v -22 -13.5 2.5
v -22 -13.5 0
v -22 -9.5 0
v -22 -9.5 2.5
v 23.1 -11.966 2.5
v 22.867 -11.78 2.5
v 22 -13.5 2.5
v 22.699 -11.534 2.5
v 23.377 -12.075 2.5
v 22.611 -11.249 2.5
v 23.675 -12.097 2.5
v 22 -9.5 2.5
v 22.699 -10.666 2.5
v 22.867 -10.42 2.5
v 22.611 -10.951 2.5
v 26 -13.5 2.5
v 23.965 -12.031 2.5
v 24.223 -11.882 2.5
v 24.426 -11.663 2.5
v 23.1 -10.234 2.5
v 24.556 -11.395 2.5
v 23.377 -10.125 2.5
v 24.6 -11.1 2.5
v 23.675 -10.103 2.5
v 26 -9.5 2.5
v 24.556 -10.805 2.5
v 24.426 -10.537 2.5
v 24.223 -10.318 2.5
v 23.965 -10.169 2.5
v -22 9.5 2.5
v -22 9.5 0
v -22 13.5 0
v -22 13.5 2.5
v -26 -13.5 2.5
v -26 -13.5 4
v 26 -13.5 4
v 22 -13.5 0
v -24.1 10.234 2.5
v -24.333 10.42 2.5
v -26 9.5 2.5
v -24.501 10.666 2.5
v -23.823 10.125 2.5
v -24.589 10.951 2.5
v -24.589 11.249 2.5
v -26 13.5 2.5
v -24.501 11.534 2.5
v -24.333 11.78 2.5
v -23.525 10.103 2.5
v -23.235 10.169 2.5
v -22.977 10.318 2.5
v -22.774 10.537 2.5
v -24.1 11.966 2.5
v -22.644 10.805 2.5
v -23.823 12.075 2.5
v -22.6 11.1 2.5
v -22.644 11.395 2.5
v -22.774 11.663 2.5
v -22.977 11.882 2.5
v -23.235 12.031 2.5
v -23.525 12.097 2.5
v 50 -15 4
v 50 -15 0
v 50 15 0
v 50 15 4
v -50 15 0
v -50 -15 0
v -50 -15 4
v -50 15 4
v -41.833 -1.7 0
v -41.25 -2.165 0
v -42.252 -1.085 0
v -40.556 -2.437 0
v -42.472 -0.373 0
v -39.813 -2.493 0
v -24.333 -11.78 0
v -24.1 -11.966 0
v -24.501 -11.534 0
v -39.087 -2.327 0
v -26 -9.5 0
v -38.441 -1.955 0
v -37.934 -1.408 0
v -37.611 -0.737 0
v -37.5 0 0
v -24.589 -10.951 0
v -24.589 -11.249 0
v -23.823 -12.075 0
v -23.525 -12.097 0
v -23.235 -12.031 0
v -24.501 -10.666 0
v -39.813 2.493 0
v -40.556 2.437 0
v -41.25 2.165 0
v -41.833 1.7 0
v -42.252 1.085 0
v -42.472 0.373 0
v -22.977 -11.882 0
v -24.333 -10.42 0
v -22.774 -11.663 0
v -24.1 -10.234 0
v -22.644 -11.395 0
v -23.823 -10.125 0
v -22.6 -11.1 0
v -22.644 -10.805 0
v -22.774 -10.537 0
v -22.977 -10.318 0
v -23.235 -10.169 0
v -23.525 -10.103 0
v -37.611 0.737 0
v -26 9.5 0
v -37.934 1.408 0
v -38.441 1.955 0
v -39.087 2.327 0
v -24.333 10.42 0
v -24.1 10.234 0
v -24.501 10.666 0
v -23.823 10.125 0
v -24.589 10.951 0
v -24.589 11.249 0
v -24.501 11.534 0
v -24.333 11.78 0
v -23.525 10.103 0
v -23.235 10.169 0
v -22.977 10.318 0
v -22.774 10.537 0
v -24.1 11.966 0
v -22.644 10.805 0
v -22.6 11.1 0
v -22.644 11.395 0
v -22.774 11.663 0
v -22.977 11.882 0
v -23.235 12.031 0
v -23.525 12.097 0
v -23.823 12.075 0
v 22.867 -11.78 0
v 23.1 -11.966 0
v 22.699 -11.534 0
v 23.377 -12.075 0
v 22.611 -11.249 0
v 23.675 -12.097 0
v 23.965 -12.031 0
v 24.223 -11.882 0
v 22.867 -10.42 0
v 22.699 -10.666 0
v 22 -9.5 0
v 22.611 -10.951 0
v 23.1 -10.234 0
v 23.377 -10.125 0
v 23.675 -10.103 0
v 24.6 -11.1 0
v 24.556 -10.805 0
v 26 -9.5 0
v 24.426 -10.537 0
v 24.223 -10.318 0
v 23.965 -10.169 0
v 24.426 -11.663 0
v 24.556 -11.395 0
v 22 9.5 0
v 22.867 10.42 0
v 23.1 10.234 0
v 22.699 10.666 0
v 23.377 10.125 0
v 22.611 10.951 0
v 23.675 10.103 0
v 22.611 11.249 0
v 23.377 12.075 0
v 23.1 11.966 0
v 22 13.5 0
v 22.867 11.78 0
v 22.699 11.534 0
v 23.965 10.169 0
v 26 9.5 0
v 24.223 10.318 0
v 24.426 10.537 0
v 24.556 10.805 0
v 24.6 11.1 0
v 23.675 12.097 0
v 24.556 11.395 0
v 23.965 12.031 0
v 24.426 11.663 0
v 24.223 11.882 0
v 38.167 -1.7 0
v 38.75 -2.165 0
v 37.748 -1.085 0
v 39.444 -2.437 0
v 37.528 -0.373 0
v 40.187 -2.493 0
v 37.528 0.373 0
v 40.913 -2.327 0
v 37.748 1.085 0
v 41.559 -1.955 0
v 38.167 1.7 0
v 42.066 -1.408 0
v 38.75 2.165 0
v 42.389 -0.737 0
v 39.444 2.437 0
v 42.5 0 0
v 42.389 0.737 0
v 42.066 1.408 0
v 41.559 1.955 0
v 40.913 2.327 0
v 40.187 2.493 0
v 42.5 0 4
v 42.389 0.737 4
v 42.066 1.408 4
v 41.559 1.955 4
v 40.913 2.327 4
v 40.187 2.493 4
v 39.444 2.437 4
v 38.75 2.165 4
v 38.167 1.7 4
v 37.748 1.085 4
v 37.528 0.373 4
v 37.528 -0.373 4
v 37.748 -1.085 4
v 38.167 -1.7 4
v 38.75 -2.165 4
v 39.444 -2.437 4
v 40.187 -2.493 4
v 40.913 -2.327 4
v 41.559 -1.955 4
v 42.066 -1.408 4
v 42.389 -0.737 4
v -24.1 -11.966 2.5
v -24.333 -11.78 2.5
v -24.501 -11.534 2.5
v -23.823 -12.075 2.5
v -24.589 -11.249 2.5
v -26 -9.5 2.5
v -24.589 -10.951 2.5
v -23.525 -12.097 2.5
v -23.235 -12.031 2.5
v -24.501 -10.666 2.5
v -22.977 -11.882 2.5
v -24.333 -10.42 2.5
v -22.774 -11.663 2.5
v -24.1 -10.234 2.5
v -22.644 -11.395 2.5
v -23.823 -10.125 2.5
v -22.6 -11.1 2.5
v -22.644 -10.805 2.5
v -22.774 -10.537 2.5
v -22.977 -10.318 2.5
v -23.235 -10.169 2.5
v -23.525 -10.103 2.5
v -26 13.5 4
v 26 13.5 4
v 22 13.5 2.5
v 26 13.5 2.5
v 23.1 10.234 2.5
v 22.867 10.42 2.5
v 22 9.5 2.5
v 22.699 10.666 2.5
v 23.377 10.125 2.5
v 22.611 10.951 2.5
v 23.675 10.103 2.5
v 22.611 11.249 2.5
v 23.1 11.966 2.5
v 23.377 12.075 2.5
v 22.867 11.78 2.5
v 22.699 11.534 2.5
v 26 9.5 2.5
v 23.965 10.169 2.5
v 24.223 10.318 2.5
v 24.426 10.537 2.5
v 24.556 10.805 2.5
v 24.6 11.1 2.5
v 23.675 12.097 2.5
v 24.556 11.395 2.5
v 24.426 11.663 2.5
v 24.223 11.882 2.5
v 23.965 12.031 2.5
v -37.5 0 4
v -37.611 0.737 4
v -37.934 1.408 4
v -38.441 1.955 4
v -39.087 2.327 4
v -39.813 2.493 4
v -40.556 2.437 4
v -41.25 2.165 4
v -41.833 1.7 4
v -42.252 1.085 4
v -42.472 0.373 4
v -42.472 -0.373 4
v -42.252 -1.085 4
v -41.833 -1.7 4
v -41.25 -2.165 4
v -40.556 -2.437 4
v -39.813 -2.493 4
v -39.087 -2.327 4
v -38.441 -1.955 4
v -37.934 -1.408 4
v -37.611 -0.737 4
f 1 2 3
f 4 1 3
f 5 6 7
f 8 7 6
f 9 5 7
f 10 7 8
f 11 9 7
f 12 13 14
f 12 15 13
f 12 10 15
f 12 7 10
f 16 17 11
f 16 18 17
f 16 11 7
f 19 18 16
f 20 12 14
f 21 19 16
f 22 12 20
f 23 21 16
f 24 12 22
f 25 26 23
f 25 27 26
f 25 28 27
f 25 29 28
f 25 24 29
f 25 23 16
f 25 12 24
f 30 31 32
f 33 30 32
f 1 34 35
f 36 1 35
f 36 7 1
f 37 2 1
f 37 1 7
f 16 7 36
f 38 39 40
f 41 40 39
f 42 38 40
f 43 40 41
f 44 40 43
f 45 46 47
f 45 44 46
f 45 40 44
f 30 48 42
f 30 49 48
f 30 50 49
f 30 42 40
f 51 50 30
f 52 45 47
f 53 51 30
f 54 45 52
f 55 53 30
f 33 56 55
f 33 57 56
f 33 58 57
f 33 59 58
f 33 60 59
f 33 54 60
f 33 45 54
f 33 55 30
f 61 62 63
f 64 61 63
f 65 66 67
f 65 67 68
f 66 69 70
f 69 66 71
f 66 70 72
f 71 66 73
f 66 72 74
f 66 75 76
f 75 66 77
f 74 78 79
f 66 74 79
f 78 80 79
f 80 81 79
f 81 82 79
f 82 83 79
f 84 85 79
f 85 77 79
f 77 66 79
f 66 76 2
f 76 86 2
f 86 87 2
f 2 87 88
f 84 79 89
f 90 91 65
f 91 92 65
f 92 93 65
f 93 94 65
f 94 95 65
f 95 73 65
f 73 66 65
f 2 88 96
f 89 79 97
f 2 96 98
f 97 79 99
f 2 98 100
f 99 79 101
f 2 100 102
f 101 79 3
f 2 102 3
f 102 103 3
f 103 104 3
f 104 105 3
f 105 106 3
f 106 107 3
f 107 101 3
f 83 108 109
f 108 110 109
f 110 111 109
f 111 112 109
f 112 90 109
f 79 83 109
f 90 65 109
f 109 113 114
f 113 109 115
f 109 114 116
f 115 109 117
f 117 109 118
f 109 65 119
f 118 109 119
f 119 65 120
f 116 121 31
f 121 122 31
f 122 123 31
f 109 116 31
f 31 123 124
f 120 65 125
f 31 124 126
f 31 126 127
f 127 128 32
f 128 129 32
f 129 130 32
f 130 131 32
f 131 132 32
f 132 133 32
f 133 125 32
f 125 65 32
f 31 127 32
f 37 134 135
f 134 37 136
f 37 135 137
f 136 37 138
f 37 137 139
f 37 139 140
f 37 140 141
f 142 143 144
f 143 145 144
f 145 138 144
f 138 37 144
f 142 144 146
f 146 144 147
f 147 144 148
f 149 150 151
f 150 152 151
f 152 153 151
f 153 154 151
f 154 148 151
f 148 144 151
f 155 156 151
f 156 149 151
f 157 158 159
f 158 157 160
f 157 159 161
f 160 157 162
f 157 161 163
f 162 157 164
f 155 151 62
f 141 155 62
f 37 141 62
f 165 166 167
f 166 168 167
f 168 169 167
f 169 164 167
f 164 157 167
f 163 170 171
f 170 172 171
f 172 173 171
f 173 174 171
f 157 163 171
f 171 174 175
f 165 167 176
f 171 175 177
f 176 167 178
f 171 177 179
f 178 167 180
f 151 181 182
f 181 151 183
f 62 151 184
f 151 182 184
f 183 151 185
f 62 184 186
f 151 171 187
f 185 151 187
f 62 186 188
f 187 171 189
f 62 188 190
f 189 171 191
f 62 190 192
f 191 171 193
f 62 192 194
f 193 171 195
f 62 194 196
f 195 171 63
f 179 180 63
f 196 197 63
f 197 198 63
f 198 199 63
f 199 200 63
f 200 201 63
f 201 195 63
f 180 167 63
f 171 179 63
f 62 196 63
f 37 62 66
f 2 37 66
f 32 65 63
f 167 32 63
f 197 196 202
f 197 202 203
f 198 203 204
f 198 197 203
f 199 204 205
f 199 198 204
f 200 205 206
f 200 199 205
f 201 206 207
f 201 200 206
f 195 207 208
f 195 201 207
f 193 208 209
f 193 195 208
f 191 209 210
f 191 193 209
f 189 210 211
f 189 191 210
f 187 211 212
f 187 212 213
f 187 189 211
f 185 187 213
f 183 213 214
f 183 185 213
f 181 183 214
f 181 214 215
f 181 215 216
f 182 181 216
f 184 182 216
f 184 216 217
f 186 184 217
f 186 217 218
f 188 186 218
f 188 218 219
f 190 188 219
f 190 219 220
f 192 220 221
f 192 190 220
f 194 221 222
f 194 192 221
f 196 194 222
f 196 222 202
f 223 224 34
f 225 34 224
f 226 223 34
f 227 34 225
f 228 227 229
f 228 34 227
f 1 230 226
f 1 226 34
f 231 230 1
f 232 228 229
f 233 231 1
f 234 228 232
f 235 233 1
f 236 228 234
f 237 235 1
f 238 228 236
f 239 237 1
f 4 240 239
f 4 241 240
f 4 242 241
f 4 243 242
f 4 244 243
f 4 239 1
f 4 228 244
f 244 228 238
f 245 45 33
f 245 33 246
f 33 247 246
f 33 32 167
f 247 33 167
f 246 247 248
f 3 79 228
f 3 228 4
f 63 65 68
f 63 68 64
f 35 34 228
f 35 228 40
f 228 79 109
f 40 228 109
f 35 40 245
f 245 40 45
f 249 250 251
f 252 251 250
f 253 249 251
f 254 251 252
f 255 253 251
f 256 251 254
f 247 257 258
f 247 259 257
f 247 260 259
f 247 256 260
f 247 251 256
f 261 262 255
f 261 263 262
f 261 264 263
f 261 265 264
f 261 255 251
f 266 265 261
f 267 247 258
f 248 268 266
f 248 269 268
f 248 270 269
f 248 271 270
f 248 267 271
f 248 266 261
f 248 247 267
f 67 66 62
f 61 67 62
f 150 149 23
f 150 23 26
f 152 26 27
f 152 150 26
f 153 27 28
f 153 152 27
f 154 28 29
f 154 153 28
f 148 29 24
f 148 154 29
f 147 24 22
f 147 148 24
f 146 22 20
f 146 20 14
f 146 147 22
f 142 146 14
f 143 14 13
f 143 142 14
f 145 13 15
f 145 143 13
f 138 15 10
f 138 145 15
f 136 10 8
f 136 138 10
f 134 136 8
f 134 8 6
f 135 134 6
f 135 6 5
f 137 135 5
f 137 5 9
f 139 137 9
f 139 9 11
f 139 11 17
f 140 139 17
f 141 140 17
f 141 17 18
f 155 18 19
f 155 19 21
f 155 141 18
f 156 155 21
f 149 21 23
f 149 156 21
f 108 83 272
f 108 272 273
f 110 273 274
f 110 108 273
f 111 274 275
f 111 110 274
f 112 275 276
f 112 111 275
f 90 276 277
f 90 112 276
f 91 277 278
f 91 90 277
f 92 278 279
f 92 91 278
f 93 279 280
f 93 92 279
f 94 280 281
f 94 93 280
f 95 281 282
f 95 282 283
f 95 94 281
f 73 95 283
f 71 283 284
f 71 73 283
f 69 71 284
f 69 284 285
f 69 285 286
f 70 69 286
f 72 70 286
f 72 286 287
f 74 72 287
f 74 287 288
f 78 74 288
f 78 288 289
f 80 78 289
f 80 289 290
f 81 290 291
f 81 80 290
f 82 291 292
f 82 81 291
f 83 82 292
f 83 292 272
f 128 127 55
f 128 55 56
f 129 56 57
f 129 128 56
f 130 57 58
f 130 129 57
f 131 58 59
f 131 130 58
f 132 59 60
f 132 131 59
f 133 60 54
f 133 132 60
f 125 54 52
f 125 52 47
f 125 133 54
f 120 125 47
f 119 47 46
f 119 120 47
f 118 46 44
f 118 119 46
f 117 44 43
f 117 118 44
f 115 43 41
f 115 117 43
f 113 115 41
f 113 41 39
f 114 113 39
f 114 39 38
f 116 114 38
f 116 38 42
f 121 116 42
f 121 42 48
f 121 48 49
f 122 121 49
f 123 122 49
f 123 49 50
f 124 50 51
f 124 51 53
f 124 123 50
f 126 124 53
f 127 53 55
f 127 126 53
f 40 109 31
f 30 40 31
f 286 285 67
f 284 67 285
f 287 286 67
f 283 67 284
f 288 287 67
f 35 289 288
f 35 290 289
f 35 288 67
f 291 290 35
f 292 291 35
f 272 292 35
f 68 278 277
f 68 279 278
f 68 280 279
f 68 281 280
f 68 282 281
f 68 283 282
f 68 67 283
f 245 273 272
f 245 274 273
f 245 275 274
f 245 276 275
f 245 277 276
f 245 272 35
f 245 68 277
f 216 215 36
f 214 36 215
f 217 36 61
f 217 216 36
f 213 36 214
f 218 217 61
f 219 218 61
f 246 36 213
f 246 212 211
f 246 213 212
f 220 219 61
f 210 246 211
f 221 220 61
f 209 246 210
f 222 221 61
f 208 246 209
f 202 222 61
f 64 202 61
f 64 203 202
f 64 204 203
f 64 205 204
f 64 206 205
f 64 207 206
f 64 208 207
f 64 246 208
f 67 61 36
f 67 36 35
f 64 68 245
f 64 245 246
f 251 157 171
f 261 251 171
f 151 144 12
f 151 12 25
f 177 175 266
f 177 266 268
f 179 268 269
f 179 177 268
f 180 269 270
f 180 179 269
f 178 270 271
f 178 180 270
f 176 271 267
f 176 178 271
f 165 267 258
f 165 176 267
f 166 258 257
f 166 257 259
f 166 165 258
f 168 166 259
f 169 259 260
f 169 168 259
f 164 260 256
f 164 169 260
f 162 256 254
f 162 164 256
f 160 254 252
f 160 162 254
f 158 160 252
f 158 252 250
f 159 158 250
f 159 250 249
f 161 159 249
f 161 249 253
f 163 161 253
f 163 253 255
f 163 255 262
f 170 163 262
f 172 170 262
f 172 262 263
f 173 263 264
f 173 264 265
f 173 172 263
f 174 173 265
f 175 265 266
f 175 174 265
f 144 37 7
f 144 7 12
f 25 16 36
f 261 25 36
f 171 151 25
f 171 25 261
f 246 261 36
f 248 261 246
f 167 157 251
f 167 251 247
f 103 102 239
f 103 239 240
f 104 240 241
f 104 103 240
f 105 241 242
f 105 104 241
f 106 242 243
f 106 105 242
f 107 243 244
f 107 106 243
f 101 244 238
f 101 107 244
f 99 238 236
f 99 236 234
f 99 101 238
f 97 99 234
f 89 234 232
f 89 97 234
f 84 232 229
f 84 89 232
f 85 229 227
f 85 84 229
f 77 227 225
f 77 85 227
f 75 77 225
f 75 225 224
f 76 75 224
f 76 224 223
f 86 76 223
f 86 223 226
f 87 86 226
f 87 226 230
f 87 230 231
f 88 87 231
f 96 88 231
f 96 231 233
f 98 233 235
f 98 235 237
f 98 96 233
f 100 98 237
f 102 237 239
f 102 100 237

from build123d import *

# Parameters (mm, degrees)
SKETCH1_W           = 100
SKETCH1_H           = 30
SKETCH1_R           = 2.5
SKETCH1_W_2         = 52
SKETCH1_H_2         = 27
BOSS_EXTRUDE1_DEPTH = 4
SKETCH2_W           = 4
SKETCH2_H           = 4
SKETCH2_R           = 1
BOSS_EXTRUDE2_DEPTH = 2.5


with BuildPart() as part:
    # Sketch1 → Boss-Extrude1 (new body)
    with BuildSketch(Plane.XY):
        Rectangle(SKETCH1_W, SKETCH1_H)
        with Locations((-40, 0)):
            Circle(SKETCH1_R, mode=Mode.SUBTRACT)
        with Locations((40, 0)):
            Circle(SKETCH1_R, mode=Mode.SUBTRACT)
        Rectangle(SKETCH1_W_2, SKETCH1_H_2, mode=Mode.SUBTRACT)
    extrude(amount=BOSS_EXTRUDE1_DEPTH)

    # Sketch2 → Boss-Extrude2 (add)
    with BuildSketch(Plane.XY):
        with Locations((24, -11.5)):
            Rectangle(SKETCH2_W, SKETCH2_H)
        with Locations((23.6, -11.1)):
            Circle(SKETCH2_R, mode=Mode.SUBTRACT)
        with Locations((24, 11.5)):
            Rectangle(SKETCH2_W, SKETCH2_H)
        with Locations((23.6, 11.1)):
            Circle(SKETCH2_R, mode=Mode.SUBTRACT)
        with Locations((-24, -11.5)):
            Rectangle(SKETCH2_W, SKETCH2_H)
        with Locations((-23.6, -11.1)):
            Circle(SKETCH2_R, mode=Mode.SUBTRACT)
        with Locations((-24, 11.5)):
            Rectangle(SKETCH2_W, SKETCH2_H)
        with Locations((-23.6, 11.1)):
            Circle(SKETCH2_R, mode=Mode.SUBTRACT)
    extrude(amount=BOSS_EXTRUDE2_DEPTH)


solid = part.part
